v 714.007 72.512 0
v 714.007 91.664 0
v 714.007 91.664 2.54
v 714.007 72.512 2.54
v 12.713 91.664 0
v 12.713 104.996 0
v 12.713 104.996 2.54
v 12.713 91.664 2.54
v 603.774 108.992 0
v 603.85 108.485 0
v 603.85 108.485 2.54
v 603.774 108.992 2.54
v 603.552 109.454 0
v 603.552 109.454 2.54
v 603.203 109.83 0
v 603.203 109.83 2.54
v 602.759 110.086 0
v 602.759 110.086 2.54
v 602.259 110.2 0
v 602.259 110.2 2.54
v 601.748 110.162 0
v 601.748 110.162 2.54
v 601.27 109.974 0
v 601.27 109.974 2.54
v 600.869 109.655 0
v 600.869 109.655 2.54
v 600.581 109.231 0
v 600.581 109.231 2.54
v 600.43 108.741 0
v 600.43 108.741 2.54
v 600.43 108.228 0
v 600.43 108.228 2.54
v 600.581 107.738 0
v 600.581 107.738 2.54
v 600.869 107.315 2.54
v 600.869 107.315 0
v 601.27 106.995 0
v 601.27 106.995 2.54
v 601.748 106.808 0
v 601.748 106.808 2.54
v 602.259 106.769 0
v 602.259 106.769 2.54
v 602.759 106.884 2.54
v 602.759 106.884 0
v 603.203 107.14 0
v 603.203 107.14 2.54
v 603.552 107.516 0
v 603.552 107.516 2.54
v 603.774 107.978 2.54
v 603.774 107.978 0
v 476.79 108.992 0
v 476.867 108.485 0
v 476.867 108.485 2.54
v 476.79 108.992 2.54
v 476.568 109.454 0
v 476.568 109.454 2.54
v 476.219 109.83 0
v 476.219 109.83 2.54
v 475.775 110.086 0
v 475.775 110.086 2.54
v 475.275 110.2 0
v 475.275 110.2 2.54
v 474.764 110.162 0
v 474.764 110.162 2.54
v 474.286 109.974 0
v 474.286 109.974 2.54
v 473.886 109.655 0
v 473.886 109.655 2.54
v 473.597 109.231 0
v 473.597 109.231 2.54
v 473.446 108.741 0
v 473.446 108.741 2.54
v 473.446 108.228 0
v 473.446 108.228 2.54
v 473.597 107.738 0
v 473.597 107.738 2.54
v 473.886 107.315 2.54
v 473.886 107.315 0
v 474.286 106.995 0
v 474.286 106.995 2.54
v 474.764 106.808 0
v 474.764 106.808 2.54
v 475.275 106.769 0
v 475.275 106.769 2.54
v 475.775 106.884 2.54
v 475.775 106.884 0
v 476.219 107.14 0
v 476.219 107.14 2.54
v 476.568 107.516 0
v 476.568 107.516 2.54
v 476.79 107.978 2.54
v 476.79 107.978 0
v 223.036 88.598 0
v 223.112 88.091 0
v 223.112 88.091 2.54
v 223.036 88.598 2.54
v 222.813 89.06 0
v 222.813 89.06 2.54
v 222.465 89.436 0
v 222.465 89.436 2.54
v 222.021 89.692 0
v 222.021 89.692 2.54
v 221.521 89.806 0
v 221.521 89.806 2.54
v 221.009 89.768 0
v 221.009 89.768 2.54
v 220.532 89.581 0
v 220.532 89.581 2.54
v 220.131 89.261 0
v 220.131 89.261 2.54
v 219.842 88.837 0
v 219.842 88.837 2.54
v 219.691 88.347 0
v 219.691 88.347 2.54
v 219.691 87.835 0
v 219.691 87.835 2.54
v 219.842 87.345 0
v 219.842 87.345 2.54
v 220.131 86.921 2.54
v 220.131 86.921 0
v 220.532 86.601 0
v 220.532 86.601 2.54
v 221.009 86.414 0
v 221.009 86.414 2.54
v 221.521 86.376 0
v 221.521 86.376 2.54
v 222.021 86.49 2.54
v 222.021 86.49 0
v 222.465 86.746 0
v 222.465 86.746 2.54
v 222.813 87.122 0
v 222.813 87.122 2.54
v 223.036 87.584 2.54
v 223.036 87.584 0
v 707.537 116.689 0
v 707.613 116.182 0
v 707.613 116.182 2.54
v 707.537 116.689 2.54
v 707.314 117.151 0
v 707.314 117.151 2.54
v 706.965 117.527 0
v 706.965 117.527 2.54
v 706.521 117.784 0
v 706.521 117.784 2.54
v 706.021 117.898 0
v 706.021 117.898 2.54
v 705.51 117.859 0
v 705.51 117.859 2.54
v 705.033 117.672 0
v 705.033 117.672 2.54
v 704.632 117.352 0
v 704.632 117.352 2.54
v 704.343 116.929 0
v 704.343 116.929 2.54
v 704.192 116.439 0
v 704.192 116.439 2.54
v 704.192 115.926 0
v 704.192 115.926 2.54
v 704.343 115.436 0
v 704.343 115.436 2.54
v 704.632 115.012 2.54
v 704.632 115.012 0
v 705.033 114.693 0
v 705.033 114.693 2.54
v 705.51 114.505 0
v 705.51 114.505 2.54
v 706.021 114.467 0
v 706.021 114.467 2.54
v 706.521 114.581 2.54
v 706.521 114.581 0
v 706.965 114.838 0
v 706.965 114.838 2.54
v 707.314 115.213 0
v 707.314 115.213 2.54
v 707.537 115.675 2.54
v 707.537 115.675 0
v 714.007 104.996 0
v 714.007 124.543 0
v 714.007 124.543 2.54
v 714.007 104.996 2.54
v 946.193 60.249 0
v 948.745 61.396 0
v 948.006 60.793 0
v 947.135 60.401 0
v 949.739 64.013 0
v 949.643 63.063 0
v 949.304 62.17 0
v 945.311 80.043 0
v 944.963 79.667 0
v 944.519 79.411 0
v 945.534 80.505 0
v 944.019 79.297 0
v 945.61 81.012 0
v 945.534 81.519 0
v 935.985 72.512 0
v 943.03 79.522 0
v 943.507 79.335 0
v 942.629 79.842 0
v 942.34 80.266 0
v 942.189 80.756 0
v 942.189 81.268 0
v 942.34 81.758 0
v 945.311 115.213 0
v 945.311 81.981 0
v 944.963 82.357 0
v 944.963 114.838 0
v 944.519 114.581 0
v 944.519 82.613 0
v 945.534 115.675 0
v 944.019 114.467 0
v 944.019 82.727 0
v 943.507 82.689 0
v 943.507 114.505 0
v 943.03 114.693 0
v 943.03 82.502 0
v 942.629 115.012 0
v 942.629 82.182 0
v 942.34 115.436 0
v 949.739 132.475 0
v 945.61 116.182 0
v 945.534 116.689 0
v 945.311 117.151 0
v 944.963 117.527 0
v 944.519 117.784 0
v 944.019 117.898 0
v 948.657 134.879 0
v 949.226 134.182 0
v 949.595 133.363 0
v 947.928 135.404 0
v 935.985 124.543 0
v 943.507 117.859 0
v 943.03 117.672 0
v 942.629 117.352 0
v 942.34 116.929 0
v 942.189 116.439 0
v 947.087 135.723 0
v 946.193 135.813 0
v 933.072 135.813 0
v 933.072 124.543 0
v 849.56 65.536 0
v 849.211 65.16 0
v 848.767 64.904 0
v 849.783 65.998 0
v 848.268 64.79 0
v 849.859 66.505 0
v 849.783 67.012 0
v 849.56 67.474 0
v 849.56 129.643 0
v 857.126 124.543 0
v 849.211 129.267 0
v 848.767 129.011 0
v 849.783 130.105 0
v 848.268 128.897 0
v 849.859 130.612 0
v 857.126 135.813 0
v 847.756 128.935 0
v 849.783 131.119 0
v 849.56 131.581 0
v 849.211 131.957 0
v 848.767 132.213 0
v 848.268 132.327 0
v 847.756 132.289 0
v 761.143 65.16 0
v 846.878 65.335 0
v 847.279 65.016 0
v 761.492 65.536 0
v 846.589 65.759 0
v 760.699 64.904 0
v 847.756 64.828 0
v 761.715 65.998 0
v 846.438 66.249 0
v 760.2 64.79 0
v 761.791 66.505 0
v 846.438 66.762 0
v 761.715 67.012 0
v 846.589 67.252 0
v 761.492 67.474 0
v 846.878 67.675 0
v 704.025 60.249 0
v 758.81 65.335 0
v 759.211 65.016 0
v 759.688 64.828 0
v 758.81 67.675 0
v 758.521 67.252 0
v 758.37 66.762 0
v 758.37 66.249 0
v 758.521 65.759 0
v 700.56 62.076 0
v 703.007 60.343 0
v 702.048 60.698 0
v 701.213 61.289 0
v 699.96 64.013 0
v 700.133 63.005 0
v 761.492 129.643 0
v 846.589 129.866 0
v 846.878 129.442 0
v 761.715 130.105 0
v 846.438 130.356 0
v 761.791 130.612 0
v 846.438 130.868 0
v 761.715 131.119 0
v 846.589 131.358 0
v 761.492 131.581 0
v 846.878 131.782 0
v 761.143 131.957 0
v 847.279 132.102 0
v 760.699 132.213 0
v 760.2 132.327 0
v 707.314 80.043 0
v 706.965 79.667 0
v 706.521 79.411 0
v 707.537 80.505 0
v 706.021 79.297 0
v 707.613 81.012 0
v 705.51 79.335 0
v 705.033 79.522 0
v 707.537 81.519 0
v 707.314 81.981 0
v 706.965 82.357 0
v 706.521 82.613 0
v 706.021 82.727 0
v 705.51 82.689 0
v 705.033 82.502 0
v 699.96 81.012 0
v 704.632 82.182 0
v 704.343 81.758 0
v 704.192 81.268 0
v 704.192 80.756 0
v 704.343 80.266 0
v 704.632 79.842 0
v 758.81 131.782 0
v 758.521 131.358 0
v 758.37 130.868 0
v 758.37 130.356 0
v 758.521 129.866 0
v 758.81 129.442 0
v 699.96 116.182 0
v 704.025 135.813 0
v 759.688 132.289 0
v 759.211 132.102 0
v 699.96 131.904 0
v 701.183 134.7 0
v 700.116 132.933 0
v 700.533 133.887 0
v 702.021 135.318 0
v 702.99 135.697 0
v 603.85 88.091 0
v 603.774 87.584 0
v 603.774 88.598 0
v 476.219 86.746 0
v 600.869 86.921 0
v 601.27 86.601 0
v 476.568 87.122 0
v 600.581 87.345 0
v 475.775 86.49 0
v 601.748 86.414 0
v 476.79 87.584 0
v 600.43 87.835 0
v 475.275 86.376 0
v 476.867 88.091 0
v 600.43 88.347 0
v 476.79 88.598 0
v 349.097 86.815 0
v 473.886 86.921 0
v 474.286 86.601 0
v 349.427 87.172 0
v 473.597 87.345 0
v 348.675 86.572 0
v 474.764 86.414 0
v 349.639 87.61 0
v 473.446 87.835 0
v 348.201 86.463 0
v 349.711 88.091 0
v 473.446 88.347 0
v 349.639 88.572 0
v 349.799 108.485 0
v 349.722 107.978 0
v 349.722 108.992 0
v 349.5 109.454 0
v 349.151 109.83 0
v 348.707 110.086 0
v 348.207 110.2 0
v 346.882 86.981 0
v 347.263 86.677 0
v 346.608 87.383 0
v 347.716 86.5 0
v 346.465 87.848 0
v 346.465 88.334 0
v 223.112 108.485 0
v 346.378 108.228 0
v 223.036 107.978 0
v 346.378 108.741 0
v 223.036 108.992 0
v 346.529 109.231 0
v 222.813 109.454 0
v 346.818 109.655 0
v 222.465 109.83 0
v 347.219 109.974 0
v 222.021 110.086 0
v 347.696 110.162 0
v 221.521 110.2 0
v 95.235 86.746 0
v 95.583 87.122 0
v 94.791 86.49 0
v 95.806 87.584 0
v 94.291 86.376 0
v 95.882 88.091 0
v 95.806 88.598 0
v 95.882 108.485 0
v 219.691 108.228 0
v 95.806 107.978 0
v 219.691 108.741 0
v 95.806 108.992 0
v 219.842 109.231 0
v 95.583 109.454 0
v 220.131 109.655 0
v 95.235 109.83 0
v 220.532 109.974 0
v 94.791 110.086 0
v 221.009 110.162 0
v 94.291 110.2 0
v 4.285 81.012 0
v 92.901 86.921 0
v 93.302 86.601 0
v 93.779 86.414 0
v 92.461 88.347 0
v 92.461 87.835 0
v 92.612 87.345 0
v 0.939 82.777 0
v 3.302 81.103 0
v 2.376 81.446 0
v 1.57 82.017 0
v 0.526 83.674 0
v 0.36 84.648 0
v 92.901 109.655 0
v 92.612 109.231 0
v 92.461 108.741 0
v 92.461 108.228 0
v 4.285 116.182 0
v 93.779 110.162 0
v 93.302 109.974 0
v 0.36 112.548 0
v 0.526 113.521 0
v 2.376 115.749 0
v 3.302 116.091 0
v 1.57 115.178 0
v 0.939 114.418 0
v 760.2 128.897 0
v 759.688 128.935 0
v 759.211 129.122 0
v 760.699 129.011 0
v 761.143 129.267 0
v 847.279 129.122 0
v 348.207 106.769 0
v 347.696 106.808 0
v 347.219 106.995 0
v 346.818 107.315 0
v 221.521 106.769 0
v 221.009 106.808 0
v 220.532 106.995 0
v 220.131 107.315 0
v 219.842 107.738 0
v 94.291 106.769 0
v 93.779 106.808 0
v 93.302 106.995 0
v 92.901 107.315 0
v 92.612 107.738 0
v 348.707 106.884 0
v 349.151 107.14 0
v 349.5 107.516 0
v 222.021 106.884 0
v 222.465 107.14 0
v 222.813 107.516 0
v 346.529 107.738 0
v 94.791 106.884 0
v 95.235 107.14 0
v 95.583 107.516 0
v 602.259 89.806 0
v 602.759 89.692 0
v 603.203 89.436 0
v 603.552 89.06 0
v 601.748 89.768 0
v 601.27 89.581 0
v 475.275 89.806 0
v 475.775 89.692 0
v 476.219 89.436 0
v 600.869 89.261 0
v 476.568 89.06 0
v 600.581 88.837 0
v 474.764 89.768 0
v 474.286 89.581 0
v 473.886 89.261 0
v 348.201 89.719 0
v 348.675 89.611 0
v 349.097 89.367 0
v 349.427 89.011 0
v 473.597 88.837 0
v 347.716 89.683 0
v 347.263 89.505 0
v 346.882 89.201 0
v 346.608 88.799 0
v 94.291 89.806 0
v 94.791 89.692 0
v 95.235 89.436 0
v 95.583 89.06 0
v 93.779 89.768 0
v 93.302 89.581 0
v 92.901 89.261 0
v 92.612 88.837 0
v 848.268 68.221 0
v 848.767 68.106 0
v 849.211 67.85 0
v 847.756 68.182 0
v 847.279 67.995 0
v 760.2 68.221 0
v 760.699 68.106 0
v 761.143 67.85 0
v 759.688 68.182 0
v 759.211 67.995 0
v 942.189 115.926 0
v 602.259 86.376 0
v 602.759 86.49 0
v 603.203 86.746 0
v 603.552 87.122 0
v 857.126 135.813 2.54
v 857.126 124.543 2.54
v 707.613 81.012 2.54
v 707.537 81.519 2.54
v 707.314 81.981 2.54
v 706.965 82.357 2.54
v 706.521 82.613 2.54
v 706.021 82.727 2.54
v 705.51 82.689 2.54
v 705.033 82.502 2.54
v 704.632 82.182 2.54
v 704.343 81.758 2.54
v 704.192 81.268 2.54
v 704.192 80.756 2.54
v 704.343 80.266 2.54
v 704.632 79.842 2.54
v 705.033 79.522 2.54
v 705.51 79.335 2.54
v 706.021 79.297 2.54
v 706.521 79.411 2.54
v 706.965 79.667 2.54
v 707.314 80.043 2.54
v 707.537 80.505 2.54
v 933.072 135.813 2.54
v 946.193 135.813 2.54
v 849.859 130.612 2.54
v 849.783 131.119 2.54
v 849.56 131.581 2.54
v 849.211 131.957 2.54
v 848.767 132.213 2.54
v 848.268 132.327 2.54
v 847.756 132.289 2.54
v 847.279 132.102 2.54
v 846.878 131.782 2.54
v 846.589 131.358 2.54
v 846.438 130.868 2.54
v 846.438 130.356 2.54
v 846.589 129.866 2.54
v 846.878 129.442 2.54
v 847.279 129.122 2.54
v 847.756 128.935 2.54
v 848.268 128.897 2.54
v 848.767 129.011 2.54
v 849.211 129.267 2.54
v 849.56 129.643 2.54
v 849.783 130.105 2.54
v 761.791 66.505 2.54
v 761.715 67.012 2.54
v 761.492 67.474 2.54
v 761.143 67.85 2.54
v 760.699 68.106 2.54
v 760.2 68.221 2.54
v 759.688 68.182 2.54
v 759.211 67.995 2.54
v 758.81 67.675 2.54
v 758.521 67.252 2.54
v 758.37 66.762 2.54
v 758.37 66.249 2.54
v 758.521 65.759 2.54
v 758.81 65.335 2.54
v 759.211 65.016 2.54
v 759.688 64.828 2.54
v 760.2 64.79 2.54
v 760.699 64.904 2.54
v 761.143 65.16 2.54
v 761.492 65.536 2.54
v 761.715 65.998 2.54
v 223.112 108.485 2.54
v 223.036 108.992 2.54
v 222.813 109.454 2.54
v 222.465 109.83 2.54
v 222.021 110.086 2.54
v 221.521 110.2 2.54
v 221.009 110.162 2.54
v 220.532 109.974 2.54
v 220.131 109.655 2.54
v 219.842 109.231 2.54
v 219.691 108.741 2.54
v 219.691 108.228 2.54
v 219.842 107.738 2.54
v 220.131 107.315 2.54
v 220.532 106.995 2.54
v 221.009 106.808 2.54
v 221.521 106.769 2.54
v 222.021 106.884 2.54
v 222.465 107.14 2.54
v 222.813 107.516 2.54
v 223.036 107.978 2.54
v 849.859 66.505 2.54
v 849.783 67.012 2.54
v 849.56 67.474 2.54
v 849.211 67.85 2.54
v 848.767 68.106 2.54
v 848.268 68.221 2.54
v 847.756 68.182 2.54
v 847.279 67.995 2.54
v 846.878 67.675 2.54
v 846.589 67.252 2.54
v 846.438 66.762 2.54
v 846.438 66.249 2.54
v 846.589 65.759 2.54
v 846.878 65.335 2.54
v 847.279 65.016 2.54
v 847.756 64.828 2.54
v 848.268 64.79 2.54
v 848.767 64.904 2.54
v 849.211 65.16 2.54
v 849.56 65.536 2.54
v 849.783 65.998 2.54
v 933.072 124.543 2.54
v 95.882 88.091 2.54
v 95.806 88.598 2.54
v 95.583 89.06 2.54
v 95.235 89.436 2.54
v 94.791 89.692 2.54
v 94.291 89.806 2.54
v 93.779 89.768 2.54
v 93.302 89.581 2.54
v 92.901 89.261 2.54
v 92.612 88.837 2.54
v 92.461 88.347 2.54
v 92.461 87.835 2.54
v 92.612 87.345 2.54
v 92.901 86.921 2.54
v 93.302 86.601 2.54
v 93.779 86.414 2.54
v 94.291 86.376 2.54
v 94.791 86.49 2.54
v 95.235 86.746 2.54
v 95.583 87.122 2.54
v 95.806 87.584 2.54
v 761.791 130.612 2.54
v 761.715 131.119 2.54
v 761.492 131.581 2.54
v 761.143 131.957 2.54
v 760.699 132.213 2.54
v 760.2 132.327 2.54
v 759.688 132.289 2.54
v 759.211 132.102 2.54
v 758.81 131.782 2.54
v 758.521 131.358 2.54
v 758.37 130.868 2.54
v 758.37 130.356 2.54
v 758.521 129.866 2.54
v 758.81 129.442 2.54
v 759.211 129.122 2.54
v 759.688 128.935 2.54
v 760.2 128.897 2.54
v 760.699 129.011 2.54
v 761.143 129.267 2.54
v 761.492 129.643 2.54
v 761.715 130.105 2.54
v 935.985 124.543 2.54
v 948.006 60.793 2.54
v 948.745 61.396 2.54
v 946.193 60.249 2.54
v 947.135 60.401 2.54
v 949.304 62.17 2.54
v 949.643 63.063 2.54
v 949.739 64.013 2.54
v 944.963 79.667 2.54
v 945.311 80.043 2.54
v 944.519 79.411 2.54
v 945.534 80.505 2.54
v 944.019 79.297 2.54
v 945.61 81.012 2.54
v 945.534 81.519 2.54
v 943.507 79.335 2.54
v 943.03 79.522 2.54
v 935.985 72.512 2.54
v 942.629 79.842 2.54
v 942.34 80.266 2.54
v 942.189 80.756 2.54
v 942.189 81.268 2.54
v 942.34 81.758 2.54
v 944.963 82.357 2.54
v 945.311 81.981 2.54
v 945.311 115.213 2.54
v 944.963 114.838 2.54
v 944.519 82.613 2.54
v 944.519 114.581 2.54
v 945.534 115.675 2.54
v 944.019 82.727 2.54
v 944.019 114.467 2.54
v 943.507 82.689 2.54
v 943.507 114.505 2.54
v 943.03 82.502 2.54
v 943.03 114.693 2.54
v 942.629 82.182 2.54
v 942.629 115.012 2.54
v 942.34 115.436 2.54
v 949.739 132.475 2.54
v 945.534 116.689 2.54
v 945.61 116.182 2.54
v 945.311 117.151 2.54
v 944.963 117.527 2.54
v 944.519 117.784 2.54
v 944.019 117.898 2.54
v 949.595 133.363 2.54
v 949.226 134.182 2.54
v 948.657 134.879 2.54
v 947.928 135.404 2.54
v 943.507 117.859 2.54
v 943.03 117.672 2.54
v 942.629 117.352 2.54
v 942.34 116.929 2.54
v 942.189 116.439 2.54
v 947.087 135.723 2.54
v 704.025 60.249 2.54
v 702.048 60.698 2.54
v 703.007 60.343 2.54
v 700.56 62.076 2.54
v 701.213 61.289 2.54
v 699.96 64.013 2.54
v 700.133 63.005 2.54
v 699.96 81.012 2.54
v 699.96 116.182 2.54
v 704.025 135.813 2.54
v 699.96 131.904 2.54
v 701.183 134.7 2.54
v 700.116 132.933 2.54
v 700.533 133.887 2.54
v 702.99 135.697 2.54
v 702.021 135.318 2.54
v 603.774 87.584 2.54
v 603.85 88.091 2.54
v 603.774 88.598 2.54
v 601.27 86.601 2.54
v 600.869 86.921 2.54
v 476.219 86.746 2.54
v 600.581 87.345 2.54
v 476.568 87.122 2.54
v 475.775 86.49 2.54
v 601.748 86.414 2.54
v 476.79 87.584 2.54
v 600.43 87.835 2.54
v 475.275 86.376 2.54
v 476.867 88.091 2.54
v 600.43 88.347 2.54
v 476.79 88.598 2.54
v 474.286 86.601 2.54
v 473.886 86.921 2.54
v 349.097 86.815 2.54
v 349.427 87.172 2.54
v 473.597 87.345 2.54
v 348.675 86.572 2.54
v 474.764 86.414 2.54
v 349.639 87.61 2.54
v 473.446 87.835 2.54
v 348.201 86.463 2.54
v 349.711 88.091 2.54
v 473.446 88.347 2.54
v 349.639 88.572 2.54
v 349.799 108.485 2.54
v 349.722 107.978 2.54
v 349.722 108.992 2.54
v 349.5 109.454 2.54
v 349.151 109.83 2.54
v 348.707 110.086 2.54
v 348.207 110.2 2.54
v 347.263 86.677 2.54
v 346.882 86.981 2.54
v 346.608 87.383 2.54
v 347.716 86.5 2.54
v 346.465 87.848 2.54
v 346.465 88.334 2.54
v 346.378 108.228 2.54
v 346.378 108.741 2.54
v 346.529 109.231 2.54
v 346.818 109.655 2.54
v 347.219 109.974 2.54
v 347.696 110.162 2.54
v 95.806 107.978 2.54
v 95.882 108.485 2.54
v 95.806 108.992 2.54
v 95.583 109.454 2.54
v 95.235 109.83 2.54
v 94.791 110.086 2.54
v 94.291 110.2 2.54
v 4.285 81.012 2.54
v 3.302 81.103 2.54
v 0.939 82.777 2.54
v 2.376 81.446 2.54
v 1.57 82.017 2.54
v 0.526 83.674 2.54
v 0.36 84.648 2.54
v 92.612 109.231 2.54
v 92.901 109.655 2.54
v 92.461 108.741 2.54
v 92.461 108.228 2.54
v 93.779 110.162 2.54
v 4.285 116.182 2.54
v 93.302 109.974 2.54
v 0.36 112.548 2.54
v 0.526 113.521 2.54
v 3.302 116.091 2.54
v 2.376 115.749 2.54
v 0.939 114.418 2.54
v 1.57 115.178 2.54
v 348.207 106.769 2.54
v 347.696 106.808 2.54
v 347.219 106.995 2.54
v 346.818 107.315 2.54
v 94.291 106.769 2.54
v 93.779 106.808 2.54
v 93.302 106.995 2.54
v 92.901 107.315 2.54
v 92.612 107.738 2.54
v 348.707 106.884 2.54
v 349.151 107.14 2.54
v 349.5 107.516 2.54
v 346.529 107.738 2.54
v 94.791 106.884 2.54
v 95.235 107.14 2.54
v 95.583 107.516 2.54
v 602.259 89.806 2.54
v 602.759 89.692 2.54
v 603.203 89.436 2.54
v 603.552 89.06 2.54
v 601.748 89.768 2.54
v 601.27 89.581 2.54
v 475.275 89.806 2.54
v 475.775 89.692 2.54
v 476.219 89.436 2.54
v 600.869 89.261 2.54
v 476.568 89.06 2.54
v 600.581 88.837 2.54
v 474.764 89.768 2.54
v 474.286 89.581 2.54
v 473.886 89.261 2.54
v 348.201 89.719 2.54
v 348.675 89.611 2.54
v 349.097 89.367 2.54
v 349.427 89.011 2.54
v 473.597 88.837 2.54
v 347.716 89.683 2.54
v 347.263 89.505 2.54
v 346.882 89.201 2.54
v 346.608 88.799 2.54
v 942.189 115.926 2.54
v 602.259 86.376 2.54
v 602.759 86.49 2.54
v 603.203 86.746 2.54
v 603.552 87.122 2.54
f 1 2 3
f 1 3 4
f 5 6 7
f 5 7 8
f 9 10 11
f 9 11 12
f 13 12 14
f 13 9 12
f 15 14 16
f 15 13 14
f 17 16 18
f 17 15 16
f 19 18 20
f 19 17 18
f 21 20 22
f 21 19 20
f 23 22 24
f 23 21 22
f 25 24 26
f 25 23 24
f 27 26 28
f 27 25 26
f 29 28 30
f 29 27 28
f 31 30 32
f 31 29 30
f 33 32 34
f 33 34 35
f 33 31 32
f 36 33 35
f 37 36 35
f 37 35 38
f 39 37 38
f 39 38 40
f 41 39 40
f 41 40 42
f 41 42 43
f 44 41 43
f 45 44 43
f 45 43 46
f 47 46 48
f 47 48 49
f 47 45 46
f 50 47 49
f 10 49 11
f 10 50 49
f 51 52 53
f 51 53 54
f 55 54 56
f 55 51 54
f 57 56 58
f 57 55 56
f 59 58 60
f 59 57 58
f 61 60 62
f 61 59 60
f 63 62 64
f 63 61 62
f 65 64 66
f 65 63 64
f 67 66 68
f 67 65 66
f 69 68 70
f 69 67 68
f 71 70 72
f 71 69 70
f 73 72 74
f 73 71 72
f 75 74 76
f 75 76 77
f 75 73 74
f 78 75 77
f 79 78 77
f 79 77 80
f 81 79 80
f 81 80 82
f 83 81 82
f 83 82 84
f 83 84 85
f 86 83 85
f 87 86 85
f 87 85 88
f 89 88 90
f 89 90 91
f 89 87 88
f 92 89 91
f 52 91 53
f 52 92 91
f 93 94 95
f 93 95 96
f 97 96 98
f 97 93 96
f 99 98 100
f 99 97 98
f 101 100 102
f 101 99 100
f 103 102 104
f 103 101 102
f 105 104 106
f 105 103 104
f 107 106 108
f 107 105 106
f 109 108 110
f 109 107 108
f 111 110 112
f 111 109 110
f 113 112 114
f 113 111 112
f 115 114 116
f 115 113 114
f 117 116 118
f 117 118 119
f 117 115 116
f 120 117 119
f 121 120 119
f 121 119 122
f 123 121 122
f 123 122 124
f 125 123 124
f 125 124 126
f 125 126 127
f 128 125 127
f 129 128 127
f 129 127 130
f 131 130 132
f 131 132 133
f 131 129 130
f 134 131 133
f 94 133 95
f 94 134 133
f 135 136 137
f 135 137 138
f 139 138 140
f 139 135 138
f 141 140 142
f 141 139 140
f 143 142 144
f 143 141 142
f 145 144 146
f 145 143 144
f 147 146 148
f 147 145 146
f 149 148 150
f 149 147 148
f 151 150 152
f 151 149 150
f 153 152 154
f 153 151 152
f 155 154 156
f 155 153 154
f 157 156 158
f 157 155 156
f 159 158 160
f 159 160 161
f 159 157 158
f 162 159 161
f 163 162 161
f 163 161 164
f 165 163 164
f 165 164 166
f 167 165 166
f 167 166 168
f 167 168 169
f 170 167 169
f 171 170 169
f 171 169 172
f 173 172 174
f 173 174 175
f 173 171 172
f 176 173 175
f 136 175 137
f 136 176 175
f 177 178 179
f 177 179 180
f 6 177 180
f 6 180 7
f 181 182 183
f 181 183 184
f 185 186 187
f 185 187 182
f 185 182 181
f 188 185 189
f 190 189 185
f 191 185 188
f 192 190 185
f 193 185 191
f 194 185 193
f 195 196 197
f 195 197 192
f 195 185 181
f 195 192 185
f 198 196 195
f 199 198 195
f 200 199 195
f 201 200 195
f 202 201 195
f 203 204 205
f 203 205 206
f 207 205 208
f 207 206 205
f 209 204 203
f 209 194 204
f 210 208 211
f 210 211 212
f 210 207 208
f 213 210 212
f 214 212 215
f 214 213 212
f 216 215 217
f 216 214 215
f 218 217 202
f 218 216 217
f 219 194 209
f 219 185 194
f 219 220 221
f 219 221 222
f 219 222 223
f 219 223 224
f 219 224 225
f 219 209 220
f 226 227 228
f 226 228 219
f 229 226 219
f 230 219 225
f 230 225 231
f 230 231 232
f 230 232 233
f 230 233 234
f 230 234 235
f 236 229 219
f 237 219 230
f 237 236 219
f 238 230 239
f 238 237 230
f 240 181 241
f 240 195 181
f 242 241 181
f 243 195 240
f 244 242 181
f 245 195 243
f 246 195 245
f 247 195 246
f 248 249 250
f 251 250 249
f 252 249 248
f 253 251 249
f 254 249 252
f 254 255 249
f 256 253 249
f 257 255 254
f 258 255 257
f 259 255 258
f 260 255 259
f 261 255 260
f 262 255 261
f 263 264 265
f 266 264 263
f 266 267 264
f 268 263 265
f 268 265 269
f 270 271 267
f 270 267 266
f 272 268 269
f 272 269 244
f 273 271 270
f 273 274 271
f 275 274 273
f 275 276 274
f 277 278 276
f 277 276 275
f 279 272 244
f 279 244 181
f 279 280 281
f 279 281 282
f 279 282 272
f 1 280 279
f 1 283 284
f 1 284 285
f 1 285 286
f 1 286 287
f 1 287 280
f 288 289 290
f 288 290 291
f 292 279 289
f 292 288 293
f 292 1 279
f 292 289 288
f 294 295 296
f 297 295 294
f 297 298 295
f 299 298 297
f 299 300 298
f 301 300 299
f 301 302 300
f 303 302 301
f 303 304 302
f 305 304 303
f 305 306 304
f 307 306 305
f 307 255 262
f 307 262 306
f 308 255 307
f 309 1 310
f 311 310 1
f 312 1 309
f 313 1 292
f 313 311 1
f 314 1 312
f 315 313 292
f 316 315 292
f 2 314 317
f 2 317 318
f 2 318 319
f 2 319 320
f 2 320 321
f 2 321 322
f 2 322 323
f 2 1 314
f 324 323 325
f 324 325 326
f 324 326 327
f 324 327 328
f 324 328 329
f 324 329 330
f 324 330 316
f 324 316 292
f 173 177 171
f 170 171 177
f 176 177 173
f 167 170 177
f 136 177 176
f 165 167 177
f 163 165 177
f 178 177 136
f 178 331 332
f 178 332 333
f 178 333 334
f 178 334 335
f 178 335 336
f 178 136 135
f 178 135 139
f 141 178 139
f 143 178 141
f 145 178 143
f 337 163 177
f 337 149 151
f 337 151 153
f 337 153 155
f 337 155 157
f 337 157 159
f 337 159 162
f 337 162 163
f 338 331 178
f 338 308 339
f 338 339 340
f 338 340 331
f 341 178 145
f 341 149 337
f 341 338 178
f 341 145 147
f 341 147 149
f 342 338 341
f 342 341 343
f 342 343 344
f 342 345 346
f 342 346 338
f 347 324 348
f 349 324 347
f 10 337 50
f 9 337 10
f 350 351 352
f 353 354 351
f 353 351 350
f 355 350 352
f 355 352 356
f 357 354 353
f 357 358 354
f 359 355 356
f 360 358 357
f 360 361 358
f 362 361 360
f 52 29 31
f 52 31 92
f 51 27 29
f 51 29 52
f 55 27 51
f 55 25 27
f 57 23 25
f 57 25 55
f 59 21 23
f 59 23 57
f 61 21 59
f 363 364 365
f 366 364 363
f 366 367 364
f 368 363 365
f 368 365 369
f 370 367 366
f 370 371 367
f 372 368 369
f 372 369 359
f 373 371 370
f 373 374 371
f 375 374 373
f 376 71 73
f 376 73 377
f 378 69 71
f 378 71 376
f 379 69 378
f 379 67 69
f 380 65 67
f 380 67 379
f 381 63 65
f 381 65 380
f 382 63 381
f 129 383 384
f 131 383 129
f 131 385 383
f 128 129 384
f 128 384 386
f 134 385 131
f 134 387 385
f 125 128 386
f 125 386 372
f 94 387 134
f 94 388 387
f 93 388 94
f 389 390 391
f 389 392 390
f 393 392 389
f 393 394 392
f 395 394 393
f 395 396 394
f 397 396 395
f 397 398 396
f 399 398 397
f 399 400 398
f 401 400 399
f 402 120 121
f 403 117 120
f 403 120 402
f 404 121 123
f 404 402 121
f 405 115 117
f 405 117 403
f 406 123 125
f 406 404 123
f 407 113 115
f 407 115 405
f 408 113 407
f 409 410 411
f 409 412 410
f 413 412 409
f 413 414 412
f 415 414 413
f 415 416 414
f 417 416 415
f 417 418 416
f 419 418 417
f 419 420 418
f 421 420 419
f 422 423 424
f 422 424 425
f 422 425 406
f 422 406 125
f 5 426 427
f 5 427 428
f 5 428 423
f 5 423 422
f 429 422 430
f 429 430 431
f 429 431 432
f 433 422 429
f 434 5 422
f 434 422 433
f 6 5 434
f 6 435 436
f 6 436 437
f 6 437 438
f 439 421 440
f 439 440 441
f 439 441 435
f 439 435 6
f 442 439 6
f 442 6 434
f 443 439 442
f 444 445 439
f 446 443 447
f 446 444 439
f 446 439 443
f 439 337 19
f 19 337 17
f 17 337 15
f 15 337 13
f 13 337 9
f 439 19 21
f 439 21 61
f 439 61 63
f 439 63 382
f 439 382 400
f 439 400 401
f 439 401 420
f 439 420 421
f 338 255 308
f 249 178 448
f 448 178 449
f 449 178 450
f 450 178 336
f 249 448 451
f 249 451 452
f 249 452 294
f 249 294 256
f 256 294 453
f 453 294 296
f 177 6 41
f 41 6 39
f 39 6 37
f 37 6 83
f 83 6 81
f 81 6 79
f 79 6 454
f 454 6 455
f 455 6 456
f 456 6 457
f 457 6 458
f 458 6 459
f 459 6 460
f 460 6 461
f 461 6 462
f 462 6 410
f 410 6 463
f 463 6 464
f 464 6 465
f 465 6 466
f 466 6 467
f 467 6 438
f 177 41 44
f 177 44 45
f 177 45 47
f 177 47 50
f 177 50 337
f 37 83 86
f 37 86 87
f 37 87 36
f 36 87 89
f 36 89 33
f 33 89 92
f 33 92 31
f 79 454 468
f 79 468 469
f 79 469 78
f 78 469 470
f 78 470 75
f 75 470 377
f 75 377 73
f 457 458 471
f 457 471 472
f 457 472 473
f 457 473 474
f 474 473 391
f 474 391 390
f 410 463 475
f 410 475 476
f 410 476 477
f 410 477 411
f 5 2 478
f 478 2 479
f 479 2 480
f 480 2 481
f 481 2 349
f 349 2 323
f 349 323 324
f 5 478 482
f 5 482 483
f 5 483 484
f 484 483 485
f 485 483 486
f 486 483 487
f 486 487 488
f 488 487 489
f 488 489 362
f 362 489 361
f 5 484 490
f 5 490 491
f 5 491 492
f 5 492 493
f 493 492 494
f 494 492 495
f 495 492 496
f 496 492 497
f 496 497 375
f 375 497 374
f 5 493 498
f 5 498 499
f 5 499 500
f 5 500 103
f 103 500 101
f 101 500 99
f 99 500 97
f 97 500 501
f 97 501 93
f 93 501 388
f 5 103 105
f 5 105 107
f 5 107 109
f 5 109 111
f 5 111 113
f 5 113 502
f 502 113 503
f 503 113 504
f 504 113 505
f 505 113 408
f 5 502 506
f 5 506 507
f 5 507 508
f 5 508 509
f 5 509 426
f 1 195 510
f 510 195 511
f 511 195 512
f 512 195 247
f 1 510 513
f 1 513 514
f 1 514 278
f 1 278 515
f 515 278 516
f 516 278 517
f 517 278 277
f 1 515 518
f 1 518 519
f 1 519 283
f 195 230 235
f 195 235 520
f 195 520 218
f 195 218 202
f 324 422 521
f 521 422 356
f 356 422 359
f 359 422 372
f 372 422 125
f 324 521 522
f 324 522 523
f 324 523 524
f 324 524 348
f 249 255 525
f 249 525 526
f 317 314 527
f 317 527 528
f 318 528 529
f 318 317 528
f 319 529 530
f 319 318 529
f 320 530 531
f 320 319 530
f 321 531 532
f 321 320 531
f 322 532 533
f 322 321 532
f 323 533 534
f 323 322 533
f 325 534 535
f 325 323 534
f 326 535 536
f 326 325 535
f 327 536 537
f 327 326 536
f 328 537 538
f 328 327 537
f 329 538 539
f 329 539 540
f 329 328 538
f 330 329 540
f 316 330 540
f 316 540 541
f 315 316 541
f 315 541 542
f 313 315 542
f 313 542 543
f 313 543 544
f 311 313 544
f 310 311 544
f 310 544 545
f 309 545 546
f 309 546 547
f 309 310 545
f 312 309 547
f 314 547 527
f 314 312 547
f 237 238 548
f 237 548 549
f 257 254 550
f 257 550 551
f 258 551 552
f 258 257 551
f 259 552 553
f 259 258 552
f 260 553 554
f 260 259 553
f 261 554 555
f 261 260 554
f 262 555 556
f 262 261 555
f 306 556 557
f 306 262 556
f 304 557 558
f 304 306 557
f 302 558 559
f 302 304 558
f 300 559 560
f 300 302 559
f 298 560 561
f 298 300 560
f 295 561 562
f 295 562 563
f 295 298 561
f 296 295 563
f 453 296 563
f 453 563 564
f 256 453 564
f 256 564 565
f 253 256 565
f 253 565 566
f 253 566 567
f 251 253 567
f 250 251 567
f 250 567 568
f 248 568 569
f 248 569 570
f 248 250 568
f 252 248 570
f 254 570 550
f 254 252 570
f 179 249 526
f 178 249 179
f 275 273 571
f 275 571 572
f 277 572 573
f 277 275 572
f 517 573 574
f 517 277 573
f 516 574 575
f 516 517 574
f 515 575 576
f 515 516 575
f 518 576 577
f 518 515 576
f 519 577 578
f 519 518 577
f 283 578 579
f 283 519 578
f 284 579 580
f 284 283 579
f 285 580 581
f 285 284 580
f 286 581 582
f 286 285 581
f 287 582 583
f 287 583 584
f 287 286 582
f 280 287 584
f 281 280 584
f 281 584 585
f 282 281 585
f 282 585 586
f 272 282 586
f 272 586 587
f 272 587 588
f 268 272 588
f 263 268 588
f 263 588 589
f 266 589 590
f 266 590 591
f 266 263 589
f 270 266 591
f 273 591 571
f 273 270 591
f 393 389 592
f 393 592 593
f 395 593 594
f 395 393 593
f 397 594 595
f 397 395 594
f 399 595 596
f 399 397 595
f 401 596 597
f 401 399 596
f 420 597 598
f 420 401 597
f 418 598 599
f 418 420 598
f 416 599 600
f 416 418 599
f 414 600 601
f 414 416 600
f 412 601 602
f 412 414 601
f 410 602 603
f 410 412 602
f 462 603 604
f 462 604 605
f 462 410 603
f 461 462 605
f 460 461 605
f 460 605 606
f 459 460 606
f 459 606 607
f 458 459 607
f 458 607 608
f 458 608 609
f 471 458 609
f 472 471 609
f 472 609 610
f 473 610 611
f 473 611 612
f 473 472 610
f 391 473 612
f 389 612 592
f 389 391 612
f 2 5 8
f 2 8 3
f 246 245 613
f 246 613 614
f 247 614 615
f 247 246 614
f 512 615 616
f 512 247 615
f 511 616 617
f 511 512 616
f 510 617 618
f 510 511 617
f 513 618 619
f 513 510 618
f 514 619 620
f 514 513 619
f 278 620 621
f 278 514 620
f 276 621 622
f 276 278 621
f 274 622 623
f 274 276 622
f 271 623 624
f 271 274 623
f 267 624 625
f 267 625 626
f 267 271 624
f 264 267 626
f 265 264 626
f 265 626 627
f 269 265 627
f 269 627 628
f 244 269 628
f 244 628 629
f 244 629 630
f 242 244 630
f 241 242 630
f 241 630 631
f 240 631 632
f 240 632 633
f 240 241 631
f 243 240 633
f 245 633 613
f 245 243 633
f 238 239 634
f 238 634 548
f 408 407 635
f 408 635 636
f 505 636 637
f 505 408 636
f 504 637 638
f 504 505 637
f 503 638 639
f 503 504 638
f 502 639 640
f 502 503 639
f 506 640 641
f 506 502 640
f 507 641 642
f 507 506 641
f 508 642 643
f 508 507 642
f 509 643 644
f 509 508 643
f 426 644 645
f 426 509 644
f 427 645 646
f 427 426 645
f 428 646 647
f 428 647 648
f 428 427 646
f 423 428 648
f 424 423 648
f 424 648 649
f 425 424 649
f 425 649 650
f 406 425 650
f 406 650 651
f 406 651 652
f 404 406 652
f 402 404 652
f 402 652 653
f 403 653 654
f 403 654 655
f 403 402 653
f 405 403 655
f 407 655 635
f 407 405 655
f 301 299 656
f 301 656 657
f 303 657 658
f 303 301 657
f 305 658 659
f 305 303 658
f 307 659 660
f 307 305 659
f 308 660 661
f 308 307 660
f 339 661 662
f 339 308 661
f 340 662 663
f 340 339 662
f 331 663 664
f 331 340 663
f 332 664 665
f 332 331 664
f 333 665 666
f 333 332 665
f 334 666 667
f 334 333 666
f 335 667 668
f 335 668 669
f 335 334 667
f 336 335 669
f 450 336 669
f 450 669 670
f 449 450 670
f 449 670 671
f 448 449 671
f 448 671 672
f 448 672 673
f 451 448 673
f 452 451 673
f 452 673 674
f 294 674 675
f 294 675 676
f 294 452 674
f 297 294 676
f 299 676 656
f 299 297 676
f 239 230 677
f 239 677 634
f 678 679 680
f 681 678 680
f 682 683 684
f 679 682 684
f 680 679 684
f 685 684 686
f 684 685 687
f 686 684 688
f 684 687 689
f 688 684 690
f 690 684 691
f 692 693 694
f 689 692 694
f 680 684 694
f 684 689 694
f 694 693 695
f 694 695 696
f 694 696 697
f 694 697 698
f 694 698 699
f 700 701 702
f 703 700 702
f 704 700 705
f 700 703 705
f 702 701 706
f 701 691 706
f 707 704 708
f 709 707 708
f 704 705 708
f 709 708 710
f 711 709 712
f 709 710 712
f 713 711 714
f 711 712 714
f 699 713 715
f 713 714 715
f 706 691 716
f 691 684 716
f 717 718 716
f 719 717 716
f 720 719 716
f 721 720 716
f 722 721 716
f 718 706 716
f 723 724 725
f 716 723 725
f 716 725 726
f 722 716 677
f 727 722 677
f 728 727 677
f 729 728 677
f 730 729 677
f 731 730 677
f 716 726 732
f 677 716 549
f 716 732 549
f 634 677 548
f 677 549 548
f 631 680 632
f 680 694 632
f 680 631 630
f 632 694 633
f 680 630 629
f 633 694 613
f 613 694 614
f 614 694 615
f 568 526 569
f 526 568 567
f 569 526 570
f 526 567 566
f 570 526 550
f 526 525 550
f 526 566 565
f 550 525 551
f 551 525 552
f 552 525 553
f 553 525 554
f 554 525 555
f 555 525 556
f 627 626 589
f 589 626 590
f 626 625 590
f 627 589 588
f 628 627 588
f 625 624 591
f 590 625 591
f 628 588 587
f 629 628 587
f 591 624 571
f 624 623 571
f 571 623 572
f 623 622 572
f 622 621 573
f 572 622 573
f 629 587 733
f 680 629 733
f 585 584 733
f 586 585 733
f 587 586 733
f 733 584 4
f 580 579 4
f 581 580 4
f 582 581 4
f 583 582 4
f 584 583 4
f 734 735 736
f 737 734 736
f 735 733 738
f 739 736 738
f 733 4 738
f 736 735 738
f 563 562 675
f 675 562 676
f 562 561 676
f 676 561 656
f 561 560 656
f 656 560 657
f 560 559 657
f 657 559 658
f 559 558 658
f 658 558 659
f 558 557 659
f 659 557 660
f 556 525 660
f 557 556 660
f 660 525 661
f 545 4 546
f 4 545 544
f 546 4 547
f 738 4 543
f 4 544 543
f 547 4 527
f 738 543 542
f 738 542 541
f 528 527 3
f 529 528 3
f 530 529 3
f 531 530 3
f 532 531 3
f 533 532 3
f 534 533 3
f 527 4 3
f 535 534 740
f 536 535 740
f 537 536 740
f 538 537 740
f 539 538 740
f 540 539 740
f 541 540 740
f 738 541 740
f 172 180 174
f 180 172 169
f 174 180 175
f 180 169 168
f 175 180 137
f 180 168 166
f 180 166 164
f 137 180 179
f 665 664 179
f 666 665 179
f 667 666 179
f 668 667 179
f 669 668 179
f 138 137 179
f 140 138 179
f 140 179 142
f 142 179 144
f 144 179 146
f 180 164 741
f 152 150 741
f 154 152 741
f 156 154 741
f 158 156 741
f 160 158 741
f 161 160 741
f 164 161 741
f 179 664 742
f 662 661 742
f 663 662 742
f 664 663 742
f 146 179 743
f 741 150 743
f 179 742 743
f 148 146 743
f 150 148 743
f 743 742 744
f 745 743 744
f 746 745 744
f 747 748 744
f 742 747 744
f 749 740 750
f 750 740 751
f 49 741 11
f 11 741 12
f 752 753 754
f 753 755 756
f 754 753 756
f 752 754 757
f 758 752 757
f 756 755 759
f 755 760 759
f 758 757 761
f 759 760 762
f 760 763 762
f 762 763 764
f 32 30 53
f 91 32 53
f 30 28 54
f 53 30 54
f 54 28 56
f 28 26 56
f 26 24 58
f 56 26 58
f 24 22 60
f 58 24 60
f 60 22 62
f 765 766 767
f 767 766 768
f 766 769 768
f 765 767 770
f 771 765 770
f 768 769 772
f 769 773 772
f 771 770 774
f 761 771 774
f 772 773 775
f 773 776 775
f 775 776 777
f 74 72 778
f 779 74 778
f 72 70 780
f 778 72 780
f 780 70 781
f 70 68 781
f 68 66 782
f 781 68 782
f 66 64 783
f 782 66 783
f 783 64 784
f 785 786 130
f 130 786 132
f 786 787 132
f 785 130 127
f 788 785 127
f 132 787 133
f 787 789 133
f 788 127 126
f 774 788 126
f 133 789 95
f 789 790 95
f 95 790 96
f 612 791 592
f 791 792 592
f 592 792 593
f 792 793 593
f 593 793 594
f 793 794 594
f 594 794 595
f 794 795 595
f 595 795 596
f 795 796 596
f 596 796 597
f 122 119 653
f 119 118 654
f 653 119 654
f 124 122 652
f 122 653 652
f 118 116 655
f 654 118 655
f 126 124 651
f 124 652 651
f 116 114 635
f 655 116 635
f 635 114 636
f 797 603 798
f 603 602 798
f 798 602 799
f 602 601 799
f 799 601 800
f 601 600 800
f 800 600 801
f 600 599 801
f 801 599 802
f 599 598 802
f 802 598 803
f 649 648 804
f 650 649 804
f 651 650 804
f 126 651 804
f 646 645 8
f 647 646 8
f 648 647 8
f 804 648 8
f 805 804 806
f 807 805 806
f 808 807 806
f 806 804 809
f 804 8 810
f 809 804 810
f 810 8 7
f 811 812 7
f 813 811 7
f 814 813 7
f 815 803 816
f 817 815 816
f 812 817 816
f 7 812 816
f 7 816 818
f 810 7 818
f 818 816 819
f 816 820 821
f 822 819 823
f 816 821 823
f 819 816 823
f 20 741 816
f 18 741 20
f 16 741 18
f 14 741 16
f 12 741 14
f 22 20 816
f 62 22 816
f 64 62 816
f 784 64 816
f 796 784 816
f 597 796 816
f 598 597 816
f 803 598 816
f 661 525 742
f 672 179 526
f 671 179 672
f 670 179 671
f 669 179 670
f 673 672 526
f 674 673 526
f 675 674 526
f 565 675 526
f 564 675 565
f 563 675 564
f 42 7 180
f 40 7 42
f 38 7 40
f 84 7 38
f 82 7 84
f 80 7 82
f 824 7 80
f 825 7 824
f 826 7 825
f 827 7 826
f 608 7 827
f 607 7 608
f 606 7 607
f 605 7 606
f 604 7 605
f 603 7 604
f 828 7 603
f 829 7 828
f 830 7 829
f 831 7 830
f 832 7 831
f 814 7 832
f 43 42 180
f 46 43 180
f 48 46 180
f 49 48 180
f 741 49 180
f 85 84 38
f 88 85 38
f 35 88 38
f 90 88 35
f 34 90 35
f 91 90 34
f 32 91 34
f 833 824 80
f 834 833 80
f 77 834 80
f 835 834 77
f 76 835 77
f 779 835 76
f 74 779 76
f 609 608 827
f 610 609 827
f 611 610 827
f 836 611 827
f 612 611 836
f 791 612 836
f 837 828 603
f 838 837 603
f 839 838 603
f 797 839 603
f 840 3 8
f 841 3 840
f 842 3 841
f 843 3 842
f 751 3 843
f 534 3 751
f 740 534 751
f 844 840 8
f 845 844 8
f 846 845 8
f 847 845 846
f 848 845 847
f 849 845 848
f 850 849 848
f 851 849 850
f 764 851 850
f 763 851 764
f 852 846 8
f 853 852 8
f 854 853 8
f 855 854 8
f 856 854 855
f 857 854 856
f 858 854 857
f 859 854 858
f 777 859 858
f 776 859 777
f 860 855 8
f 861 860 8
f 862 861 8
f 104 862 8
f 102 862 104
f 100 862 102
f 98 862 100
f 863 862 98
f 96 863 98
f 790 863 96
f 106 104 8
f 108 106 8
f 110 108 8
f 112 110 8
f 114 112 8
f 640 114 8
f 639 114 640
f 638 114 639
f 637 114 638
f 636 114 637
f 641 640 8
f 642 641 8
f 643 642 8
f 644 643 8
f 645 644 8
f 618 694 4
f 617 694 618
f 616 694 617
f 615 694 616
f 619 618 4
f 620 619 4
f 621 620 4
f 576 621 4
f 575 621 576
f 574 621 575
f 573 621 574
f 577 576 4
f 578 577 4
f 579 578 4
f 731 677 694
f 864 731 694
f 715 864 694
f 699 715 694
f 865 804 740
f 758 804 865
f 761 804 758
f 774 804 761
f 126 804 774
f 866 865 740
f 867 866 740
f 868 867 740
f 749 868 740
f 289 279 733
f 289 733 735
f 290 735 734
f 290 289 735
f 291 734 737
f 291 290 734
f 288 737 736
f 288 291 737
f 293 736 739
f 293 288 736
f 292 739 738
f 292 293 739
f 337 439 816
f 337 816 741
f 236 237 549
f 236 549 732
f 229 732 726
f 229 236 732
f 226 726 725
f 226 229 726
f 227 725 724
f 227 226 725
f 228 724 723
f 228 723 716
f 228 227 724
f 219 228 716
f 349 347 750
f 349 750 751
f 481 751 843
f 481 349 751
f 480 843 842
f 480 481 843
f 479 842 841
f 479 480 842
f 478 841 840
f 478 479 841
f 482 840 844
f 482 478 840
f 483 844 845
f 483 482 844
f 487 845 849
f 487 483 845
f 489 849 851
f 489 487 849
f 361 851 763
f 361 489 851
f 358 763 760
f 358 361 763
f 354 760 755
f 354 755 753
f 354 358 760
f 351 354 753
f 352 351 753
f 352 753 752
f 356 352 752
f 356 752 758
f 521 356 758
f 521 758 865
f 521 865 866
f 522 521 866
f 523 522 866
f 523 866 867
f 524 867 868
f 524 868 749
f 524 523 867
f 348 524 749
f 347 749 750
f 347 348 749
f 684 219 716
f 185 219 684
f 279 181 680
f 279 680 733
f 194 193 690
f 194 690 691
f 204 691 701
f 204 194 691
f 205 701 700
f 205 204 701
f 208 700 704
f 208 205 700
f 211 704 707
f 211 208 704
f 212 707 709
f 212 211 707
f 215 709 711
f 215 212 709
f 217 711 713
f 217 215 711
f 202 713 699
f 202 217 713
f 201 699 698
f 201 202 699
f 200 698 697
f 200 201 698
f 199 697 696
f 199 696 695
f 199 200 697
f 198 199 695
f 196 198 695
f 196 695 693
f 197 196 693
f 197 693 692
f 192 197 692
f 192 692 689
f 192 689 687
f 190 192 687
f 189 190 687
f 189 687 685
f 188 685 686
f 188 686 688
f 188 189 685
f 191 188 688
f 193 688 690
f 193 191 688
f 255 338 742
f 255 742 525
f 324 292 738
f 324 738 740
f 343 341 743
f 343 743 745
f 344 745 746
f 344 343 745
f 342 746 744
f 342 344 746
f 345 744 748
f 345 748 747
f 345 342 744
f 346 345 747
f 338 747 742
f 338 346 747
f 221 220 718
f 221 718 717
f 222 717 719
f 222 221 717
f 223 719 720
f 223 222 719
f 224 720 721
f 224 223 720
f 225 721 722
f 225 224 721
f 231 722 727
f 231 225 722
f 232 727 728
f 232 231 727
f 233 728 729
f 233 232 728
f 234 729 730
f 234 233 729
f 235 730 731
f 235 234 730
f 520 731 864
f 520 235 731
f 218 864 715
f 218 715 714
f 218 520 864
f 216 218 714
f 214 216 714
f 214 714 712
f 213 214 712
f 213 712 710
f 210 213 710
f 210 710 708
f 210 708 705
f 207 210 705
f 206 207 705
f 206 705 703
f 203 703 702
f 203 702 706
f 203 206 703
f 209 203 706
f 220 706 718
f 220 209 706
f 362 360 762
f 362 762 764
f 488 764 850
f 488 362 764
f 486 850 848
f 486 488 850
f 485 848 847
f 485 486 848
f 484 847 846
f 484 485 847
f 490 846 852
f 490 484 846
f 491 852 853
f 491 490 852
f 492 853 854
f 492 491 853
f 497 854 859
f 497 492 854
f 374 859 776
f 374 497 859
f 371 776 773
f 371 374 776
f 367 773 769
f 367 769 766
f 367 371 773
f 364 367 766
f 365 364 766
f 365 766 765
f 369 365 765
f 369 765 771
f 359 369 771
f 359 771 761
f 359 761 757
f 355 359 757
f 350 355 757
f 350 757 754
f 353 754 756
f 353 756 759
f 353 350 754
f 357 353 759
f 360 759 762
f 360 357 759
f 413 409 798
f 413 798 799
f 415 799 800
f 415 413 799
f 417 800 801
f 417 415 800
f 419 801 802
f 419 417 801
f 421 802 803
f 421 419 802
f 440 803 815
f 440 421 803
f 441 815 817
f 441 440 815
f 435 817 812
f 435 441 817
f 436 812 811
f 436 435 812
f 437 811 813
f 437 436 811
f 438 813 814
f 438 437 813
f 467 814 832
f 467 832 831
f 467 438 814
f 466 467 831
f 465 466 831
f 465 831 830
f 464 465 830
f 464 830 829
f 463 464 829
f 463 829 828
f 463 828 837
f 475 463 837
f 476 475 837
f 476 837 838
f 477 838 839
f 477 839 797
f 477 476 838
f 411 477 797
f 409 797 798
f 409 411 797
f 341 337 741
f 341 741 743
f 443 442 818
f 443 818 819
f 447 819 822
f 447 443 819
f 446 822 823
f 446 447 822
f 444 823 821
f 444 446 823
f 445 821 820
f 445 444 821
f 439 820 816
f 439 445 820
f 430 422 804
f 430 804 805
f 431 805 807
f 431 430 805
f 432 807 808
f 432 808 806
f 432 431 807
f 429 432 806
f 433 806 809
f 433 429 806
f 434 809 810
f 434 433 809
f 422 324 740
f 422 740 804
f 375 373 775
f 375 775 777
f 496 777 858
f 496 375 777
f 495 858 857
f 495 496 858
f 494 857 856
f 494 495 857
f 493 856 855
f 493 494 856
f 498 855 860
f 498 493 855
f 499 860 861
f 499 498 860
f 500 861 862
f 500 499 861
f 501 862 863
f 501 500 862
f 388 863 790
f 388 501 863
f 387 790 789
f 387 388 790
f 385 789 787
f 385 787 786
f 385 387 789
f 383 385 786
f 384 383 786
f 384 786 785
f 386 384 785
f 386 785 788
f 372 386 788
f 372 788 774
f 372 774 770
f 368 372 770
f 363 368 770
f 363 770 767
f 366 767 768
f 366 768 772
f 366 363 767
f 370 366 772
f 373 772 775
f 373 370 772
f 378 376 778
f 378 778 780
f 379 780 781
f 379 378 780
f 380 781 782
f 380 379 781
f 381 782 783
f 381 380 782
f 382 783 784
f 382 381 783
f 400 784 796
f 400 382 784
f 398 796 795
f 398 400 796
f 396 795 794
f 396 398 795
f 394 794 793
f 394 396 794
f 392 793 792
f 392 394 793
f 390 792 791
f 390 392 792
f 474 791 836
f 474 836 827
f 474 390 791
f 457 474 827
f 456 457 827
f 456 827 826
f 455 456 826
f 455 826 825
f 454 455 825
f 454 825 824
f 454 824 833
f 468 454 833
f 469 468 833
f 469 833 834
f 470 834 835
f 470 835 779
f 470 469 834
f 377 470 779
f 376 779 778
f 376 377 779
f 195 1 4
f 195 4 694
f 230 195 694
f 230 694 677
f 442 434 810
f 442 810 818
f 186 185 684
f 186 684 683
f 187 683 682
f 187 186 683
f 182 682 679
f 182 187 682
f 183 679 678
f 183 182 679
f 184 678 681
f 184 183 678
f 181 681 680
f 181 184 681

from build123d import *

# Parameters (mm, degrees)
SKETCH1_R           = 1.720095417
SKETCH1_R_2         = 1.632335783
BOSS_EXTRUDE1_DEPTH = 2.54


with BuildPart() as part:
    # Sketch1 → Boss-Extrude1 (new body)
    with BuildSketch(Plane.XY):
        with BuildLine():
            Line((0.359622665, 112.547896558), (0.359622665, 84.647626996))
            ThreePointArc((0.359622665, 84.647626996), (1.569547298, 82.016705042), (4.285435965, 81.011908201))
            Line((4.285435965, 81.011908201), (699.960441306, 81.011908201))
            Line((699.960441306, 81.011908201), (699.960441306, 64.012598058))
            ThreePointArc((699.960441306, 64.012598058), (701.213068629, 61.288906282), (704.024750828, 60.24870663))
            Line((704.024750828, 60.24870663), (946.192785632, 60.24870663))
            ThreePointArc((946.192785632, 60.24870663), (948.74540471, 61.39621374), (949.738968911, 64.012598058))
            Line((949.738968911, 64.012598058), (949.738968911, 132.475411377))
            ThreePointArc((949.738968911, 132.475411377), (948.657072186, 134.878542119), (946.192785632, 135.812795653))
            Line((946.192785632, 135.812795653), (933.071984653, 135.812795653))
            Line((933.071984653, 135.812795653), (933.071984653, 124.543323228))
            Line((933.071984653, 124.543323228), (935.984655082, 124.543323228))
            Line((935.984655082, 124.543323228), (935.984655082, 72.51225313))
            Line((935.984655082, 72.51225313), (714.00720644, 72.51225313))
            Line((714.00720644, 72.51225313), (714.00720644, 91.663924817))
            Line((714.00720644, 91.663924817), (12.71320644, 91.663924817))
            Line((12.71320644, 91.663924817), (12.71320644, 104.995667719))
            Line((12.71320644, 104.995667719), (714.00720644, 104.995667719))
            Line((714.00720644, 104.995667719), (714.00720644, 124.543323228))
            Line((714.00720644, 124.543323228), (857.125984653, 124.543323228))
            Line((857.125984653, 124.543323228), (857.125984653, 135.812795653))
            Line((857.125984653, 135.812795653), (704.024750828, 135.812795653))
            ThreePointArc((704.024750828, 135.812795653), (701.183091811, 134.700225562), (699.960441306, 131.904163347))
            Line((699.960441306, 131.904163347), (699.960441306, 116.18243367))
            Line((699.960441306, 116.18243367), (4.285435965, 116.18243367))
            ThreePointArc((4.285435965, 116.18243367), (1.569792033, 115.17822767), (0.359622665, 112.547896558))
        make_face()
        with Locations((94.1622142, 88.091107164)):
            Circle(SKETCH1_R, mode=Mode.SUBTRACT)
        with Locations((221.392126764, 88.091107164)):
            Circle(SKETCH1_R, mode=Mode.SUBTRACT)
        with Locations((348.078760153, 88.091107164)):
            Circle(SKETCH1_R_2, mode=Mode.SUBTRACT)
        with Locations((760.070975046, 66.505299661)):
            Circle(SKETCH1_R, mode=Mode.SUBTRACT)
        with Locations((848.138968911, 66.505299661)):
            Circle(SKETCH1_R, mode=Mode.SUBTRACT)
        with Locations((475.146430575, 88.091107164)):
            Circle(SKETCH1_R, mode=Mode.SUBTRACT)
        with Locations((705.892847696, 81.011908201)):
            Circle(SKETCH1_R, mode=Mode.SUBTRACT)
        with Locations((602.130384222, 88.091107164)):
            Circle(SKETCH1_R, mode=Mode.SUBTRACT)
        with Locations((943.890172073, 81.011908201)):
            Circle(SKETCH1_R, mode=Mode.SUBTRACT)
        with Locations((94.1622142, 108.484732819)):
            Circle(SKETCH1_R, mode=Mode.SUBTRACT)
        with Locations((221.392126764, 108.484732819)):
            Circle(SKETCH1_R, mode=Mode.SUBTRACT)
        with Locations((348.078760153, 108.484732819)):
            Circle(SKETCH1_R, mode=Mode.SUBTRACT)
        with Locations((475.146430575, 108.484732819)):
            Circle(SKETCH1_R, mode=Mode.SUBTRACT)
        with Locations((602.130384222, 108.484732819)):
            Circle(SKETCH1_R, mode=Mode.SUBTRACT)
        with Locations((705.892847696, 116.18243367)):
            Circle(SKETCH1_R, mode=Mode.SUBTRACT)
        with Locations((943.890172073, 116.18243367)):
            Circle(SKETCH1_R, mode=Mode.SUBTRACT)
        with Locations((760.070975046, 130.611938178)):
            Circle(SKETCH1_R, mode=Mode.SUBTRACT)
        with Locations((848.138968911, 130.611938178)):
            Circle(SKETCH1_R, mode=Mode.SUBTRACT)
    extrude(amount=BOSS_EXTRUDE1_DEPTH)


solid = part.part
